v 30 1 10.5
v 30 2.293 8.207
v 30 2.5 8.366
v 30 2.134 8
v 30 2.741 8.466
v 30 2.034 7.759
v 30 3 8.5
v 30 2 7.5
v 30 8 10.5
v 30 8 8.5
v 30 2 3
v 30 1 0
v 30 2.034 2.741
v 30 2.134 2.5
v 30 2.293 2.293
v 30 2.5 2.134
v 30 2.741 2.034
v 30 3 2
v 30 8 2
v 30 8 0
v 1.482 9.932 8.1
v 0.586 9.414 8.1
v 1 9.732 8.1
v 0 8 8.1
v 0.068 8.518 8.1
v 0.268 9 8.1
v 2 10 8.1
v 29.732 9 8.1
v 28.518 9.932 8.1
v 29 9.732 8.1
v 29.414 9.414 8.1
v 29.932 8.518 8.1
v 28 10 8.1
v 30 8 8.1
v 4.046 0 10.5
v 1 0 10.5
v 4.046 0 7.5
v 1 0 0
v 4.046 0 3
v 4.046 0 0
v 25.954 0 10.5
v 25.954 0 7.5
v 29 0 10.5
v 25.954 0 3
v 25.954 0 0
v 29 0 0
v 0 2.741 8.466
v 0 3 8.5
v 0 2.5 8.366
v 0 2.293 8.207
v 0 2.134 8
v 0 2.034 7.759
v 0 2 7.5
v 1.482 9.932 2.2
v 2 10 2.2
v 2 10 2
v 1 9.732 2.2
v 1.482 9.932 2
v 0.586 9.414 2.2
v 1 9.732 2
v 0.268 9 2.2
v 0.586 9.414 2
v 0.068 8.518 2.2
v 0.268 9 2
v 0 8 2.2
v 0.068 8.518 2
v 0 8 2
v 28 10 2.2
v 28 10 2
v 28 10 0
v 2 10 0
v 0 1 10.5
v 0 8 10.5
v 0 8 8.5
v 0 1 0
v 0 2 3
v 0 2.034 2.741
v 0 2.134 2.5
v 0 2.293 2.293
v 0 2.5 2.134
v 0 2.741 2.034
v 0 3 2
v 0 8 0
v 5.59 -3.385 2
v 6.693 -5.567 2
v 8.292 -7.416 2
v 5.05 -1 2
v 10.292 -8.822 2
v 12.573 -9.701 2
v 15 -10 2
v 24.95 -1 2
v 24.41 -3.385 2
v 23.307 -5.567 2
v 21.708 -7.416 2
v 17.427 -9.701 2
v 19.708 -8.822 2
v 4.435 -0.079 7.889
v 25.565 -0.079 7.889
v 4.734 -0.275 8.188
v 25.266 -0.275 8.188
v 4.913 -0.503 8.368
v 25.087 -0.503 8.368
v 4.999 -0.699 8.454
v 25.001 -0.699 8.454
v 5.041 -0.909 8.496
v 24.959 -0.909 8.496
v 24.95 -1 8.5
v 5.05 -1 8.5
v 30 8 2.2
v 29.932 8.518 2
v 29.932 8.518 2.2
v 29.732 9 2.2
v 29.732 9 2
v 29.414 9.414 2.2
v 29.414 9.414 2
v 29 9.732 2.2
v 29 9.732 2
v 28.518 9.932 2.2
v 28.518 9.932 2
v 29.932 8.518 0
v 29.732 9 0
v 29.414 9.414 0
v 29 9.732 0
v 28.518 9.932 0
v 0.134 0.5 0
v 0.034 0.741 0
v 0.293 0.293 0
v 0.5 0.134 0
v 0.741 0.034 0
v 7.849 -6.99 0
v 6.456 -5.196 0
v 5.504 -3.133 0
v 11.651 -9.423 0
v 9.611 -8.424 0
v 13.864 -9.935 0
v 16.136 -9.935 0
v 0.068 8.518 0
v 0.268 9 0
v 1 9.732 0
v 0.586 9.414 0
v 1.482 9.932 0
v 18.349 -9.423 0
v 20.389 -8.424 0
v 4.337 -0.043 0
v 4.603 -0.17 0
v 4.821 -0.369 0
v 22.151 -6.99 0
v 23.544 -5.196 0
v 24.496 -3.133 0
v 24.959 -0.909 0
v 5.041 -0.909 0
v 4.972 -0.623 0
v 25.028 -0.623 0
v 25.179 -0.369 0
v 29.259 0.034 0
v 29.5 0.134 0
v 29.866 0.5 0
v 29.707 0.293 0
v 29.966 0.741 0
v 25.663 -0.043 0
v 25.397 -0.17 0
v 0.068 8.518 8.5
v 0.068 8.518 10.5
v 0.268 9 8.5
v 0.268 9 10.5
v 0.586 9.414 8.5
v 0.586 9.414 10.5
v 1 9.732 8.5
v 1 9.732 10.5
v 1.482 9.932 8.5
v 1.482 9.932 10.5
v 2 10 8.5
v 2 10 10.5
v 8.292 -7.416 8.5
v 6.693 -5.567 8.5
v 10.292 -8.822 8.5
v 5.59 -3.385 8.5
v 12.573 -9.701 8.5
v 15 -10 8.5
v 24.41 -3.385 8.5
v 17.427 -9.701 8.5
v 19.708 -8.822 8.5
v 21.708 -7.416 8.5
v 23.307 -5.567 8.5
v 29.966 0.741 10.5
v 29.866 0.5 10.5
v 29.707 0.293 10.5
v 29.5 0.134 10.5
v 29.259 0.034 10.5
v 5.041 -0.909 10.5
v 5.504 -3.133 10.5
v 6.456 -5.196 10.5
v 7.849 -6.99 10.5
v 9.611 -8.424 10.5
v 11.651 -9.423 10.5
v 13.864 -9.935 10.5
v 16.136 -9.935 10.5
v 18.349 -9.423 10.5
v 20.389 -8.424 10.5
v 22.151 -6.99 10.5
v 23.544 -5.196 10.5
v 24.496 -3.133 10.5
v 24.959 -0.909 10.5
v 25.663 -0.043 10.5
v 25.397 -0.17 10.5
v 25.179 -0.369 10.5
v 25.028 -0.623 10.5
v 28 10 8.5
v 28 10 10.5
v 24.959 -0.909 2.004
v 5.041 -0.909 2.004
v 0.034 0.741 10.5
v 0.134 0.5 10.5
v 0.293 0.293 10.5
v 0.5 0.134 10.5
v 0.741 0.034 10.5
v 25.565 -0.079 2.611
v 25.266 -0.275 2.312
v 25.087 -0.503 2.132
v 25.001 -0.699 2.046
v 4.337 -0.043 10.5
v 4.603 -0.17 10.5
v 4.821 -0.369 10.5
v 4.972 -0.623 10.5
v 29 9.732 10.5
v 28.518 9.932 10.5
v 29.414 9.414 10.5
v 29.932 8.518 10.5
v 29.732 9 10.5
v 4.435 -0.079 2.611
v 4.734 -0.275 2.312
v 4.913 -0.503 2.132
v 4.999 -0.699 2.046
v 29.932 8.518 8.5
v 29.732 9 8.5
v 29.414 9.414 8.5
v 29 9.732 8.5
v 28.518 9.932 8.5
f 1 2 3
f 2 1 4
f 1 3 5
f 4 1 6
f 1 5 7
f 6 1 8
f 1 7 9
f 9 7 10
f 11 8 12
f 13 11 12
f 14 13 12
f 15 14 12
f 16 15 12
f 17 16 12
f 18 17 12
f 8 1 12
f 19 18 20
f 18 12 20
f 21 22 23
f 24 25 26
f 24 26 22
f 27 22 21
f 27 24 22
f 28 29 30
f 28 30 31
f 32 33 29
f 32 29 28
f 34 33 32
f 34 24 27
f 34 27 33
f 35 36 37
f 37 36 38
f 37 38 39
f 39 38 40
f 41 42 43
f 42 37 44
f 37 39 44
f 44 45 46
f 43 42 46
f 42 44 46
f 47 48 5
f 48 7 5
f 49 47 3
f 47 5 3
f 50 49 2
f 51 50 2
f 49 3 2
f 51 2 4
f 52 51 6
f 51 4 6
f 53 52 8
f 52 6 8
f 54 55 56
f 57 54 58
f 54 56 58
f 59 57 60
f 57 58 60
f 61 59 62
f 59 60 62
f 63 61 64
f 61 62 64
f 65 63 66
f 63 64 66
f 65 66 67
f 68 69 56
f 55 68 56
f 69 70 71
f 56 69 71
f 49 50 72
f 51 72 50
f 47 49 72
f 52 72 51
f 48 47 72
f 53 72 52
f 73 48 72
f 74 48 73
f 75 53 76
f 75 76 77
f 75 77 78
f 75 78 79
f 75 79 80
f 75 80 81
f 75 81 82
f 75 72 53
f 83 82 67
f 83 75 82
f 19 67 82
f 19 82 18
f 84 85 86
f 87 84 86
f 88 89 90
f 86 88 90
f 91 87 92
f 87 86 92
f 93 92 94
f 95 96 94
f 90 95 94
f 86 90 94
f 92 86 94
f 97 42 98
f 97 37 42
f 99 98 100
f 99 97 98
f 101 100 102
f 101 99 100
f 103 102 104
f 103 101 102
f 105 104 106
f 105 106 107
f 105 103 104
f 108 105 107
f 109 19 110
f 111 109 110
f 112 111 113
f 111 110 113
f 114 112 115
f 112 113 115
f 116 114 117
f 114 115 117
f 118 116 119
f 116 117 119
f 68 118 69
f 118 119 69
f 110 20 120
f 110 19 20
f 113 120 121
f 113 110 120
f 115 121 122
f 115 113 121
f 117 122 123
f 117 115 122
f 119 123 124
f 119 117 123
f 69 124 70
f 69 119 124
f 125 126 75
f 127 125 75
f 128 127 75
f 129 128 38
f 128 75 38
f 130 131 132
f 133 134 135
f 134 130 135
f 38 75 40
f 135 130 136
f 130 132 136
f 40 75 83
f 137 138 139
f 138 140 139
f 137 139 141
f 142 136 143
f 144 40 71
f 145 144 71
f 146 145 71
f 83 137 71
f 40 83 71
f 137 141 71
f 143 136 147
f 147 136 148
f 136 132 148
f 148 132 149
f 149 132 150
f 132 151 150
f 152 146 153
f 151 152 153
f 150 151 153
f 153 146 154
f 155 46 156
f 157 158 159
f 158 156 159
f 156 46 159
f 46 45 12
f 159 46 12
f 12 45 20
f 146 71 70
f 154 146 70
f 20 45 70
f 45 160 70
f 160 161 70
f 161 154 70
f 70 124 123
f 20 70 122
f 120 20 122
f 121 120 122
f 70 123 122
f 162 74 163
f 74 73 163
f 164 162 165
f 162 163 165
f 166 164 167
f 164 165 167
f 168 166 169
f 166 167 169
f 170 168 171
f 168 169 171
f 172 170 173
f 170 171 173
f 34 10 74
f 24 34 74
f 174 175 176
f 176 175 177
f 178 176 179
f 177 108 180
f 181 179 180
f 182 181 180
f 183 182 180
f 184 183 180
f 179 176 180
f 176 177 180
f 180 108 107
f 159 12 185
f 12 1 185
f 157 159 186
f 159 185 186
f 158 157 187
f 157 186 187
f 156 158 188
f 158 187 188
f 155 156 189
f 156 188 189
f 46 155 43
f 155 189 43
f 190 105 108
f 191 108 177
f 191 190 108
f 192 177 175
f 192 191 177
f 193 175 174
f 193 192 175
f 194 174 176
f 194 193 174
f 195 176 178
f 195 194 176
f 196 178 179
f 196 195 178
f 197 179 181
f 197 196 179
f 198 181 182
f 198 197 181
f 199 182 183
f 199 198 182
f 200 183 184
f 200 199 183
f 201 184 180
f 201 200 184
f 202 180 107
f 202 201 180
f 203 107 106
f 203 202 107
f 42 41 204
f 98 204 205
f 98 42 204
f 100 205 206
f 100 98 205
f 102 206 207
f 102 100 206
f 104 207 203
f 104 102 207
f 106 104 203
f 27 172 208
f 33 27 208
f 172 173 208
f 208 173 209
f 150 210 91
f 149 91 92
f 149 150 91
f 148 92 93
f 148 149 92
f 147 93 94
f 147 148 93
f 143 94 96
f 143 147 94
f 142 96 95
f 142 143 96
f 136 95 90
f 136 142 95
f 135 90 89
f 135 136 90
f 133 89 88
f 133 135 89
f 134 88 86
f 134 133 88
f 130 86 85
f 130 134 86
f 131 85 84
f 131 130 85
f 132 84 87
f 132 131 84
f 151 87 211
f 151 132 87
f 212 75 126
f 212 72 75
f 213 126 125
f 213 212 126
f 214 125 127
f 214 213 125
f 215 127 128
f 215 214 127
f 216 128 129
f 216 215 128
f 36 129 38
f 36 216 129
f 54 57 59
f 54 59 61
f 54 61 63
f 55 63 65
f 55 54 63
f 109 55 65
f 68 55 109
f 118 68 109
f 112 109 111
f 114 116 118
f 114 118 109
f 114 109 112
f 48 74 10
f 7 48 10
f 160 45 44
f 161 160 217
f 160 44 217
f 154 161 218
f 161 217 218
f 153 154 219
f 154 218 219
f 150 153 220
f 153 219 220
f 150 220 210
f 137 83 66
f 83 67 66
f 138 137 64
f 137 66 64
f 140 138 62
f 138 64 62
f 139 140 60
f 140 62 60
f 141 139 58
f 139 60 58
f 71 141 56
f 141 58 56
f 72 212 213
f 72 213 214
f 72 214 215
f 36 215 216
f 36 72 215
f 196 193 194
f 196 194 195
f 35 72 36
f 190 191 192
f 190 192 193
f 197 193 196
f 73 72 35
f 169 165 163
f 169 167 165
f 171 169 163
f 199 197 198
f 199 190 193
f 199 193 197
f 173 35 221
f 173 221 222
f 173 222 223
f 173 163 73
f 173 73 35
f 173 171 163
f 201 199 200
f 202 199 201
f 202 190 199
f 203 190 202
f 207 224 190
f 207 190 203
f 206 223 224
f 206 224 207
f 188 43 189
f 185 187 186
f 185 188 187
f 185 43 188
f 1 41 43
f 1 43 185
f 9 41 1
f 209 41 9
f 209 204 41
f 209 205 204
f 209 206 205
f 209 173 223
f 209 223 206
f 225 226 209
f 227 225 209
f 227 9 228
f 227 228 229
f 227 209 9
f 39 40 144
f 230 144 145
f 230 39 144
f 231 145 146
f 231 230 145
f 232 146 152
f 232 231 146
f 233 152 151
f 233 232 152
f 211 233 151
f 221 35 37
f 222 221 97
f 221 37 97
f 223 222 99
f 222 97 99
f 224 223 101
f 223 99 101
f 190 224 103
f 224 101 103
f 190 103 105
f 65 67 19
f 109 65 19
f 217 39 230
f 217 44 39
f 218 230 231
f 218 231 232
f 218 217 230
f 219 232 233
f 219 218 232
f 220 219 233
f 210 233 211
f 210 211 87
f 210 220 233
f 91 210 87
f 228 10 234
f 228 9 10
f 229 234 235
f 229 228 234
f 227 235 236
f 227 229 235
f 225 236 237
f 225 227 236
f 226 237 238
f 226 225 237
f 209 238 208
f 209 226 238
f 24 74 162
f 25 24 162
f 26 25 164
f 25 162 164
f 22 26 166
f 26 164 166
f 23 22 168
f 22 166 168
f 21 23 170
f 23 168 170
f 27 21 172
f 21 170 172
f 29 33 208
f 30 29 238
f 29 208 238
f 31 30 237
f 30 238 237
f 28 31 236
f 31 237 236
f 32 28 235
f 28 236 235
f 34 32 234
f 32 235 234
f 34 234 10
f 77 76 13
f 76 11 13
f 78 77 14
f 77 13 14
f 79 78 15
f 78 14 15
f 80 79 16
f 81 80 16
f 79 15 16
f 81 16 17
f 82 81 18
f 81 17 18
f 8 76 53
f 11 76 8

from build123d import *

# Parameters (mm, degrees)
F0_W      = 30
F0_H      = 10
F1_DEPTH  = 2
F2_W      = 30
F2_H      = 2
F3_DEPTH  = 6.5
F4_W      = 30
F4_H      = 10
F5_DEPTH  = 2
F6_R      = 2
F8_DEPTH  = 0.2
F10_DEPTH = 0.4
F12_DEPTH = 2
F14_DEPTH = 2
F15_R     = 1


with BuildPart() as f1:
    # F0 (on Top) → F1 (new body)
    with BuildSketch(Plane.XY):
        with Locations((15, 5)):
            Rectangle(F0_W, F0_H)
    extrude(amount=F1_DEPTH)

    # F2 (on face) → F3 (join)
    with BuildSketch(Plane.XY.offset(2)):
        with Locations((15, 1)):
            Rectangle(F2_W, F2_H)
    extrude(amount=F3_DEPTH)

    # F4 (on face) → F5 (join)
    with BuildSketch(Plane.XY.offset(8.5)):
        with Locations((15, 5)):
            Rectangle(F4_W, F4_H)
    extrude(amount=F5_DEPTH)

    # F6
    f6_edges = [f1.edges().sort_by_distance(p)[0] for p in [
        (30, 10, 9.5),
        (30, 10, 1),
        (0, 10, 9.5),
        (0, 10, 1),
    ]]
    fillet(f6_edges, radius=F6_R)

    # F7 (on face) → F8 (join)
    with BuildSketch(Plane.XY.offset(2)):
        with BuildLine():
            Line((28, 10), (2, 10))
            ThreePointArc((2, 10), (0.5857864376, 9.4142135624), (0, 8))
            Line((0, 8), (30, 8))
            ThreePointArc((30, 8), (29.4142135624, 9.4142135624), (28, 10))
        make_face()
    extrude(amount=F8_DEPTH)

    # F9 (on face) → F10 (join)
    with BuildSketch(Plane(origin=(0, 0, 8.5), x_dir=(1, 0, 0), z_dir=(0, 0, -1))):
        with BuildLine():
            ThreePointArc((0, -8), (0.5857864376, -9.4142135624), (2, -10))
            Line((2, -10), (28, -10))
            ThreePointArc((28, -10), (29.4142135624, -9.4142135624), (30, -8))
            Line((30, -8), (0, -8))
        make_face()
    extrude(amount=F10_DEPTH)

    # F11 (on face) → F12 (join, through all)
    with BuildSketch(Plane.XY.offset(10.5)):
        with BuildLine():
            Line((25, 0), (15, 0))
            Line((15, 0), (5, 0))
            ThreePointArc((5, 0), (15, -10), (25, 0))
        make_face()
    extrude(amount=-F12_DEPTH)

    # F13 (on face) → F14 (join, through all)
    with BuildSketch(Plane(origin=(0, 0, 0), x_dir=(1, 0, 0), z_dir=(0, 0, -1))):
        with BuildLine():
            ThreePointArc((25, 0), (15, 10), (5, 0))
            Line((5, 0), (25, 0))
        make_face()
    extrude(amount=-F14_DEPTH)

    # F15
    f15_edges = [f1.edges().sort_by_distance(p)[0] for p in [
        (15, 0, 2),
        (15, 0, 8.5),
        (5, 0, 9.5),
        (5, 0, 1),
        (25, 0, 9.5),
        (30, 0, 5.25),
        (0, 0, 5.25),
        (15, 2, 2),
        (15, 2, 8.5),
        (25, 0, 1),
    ]]
    fillet(f15_edges, radius=F15_R)


solid = f1.part
